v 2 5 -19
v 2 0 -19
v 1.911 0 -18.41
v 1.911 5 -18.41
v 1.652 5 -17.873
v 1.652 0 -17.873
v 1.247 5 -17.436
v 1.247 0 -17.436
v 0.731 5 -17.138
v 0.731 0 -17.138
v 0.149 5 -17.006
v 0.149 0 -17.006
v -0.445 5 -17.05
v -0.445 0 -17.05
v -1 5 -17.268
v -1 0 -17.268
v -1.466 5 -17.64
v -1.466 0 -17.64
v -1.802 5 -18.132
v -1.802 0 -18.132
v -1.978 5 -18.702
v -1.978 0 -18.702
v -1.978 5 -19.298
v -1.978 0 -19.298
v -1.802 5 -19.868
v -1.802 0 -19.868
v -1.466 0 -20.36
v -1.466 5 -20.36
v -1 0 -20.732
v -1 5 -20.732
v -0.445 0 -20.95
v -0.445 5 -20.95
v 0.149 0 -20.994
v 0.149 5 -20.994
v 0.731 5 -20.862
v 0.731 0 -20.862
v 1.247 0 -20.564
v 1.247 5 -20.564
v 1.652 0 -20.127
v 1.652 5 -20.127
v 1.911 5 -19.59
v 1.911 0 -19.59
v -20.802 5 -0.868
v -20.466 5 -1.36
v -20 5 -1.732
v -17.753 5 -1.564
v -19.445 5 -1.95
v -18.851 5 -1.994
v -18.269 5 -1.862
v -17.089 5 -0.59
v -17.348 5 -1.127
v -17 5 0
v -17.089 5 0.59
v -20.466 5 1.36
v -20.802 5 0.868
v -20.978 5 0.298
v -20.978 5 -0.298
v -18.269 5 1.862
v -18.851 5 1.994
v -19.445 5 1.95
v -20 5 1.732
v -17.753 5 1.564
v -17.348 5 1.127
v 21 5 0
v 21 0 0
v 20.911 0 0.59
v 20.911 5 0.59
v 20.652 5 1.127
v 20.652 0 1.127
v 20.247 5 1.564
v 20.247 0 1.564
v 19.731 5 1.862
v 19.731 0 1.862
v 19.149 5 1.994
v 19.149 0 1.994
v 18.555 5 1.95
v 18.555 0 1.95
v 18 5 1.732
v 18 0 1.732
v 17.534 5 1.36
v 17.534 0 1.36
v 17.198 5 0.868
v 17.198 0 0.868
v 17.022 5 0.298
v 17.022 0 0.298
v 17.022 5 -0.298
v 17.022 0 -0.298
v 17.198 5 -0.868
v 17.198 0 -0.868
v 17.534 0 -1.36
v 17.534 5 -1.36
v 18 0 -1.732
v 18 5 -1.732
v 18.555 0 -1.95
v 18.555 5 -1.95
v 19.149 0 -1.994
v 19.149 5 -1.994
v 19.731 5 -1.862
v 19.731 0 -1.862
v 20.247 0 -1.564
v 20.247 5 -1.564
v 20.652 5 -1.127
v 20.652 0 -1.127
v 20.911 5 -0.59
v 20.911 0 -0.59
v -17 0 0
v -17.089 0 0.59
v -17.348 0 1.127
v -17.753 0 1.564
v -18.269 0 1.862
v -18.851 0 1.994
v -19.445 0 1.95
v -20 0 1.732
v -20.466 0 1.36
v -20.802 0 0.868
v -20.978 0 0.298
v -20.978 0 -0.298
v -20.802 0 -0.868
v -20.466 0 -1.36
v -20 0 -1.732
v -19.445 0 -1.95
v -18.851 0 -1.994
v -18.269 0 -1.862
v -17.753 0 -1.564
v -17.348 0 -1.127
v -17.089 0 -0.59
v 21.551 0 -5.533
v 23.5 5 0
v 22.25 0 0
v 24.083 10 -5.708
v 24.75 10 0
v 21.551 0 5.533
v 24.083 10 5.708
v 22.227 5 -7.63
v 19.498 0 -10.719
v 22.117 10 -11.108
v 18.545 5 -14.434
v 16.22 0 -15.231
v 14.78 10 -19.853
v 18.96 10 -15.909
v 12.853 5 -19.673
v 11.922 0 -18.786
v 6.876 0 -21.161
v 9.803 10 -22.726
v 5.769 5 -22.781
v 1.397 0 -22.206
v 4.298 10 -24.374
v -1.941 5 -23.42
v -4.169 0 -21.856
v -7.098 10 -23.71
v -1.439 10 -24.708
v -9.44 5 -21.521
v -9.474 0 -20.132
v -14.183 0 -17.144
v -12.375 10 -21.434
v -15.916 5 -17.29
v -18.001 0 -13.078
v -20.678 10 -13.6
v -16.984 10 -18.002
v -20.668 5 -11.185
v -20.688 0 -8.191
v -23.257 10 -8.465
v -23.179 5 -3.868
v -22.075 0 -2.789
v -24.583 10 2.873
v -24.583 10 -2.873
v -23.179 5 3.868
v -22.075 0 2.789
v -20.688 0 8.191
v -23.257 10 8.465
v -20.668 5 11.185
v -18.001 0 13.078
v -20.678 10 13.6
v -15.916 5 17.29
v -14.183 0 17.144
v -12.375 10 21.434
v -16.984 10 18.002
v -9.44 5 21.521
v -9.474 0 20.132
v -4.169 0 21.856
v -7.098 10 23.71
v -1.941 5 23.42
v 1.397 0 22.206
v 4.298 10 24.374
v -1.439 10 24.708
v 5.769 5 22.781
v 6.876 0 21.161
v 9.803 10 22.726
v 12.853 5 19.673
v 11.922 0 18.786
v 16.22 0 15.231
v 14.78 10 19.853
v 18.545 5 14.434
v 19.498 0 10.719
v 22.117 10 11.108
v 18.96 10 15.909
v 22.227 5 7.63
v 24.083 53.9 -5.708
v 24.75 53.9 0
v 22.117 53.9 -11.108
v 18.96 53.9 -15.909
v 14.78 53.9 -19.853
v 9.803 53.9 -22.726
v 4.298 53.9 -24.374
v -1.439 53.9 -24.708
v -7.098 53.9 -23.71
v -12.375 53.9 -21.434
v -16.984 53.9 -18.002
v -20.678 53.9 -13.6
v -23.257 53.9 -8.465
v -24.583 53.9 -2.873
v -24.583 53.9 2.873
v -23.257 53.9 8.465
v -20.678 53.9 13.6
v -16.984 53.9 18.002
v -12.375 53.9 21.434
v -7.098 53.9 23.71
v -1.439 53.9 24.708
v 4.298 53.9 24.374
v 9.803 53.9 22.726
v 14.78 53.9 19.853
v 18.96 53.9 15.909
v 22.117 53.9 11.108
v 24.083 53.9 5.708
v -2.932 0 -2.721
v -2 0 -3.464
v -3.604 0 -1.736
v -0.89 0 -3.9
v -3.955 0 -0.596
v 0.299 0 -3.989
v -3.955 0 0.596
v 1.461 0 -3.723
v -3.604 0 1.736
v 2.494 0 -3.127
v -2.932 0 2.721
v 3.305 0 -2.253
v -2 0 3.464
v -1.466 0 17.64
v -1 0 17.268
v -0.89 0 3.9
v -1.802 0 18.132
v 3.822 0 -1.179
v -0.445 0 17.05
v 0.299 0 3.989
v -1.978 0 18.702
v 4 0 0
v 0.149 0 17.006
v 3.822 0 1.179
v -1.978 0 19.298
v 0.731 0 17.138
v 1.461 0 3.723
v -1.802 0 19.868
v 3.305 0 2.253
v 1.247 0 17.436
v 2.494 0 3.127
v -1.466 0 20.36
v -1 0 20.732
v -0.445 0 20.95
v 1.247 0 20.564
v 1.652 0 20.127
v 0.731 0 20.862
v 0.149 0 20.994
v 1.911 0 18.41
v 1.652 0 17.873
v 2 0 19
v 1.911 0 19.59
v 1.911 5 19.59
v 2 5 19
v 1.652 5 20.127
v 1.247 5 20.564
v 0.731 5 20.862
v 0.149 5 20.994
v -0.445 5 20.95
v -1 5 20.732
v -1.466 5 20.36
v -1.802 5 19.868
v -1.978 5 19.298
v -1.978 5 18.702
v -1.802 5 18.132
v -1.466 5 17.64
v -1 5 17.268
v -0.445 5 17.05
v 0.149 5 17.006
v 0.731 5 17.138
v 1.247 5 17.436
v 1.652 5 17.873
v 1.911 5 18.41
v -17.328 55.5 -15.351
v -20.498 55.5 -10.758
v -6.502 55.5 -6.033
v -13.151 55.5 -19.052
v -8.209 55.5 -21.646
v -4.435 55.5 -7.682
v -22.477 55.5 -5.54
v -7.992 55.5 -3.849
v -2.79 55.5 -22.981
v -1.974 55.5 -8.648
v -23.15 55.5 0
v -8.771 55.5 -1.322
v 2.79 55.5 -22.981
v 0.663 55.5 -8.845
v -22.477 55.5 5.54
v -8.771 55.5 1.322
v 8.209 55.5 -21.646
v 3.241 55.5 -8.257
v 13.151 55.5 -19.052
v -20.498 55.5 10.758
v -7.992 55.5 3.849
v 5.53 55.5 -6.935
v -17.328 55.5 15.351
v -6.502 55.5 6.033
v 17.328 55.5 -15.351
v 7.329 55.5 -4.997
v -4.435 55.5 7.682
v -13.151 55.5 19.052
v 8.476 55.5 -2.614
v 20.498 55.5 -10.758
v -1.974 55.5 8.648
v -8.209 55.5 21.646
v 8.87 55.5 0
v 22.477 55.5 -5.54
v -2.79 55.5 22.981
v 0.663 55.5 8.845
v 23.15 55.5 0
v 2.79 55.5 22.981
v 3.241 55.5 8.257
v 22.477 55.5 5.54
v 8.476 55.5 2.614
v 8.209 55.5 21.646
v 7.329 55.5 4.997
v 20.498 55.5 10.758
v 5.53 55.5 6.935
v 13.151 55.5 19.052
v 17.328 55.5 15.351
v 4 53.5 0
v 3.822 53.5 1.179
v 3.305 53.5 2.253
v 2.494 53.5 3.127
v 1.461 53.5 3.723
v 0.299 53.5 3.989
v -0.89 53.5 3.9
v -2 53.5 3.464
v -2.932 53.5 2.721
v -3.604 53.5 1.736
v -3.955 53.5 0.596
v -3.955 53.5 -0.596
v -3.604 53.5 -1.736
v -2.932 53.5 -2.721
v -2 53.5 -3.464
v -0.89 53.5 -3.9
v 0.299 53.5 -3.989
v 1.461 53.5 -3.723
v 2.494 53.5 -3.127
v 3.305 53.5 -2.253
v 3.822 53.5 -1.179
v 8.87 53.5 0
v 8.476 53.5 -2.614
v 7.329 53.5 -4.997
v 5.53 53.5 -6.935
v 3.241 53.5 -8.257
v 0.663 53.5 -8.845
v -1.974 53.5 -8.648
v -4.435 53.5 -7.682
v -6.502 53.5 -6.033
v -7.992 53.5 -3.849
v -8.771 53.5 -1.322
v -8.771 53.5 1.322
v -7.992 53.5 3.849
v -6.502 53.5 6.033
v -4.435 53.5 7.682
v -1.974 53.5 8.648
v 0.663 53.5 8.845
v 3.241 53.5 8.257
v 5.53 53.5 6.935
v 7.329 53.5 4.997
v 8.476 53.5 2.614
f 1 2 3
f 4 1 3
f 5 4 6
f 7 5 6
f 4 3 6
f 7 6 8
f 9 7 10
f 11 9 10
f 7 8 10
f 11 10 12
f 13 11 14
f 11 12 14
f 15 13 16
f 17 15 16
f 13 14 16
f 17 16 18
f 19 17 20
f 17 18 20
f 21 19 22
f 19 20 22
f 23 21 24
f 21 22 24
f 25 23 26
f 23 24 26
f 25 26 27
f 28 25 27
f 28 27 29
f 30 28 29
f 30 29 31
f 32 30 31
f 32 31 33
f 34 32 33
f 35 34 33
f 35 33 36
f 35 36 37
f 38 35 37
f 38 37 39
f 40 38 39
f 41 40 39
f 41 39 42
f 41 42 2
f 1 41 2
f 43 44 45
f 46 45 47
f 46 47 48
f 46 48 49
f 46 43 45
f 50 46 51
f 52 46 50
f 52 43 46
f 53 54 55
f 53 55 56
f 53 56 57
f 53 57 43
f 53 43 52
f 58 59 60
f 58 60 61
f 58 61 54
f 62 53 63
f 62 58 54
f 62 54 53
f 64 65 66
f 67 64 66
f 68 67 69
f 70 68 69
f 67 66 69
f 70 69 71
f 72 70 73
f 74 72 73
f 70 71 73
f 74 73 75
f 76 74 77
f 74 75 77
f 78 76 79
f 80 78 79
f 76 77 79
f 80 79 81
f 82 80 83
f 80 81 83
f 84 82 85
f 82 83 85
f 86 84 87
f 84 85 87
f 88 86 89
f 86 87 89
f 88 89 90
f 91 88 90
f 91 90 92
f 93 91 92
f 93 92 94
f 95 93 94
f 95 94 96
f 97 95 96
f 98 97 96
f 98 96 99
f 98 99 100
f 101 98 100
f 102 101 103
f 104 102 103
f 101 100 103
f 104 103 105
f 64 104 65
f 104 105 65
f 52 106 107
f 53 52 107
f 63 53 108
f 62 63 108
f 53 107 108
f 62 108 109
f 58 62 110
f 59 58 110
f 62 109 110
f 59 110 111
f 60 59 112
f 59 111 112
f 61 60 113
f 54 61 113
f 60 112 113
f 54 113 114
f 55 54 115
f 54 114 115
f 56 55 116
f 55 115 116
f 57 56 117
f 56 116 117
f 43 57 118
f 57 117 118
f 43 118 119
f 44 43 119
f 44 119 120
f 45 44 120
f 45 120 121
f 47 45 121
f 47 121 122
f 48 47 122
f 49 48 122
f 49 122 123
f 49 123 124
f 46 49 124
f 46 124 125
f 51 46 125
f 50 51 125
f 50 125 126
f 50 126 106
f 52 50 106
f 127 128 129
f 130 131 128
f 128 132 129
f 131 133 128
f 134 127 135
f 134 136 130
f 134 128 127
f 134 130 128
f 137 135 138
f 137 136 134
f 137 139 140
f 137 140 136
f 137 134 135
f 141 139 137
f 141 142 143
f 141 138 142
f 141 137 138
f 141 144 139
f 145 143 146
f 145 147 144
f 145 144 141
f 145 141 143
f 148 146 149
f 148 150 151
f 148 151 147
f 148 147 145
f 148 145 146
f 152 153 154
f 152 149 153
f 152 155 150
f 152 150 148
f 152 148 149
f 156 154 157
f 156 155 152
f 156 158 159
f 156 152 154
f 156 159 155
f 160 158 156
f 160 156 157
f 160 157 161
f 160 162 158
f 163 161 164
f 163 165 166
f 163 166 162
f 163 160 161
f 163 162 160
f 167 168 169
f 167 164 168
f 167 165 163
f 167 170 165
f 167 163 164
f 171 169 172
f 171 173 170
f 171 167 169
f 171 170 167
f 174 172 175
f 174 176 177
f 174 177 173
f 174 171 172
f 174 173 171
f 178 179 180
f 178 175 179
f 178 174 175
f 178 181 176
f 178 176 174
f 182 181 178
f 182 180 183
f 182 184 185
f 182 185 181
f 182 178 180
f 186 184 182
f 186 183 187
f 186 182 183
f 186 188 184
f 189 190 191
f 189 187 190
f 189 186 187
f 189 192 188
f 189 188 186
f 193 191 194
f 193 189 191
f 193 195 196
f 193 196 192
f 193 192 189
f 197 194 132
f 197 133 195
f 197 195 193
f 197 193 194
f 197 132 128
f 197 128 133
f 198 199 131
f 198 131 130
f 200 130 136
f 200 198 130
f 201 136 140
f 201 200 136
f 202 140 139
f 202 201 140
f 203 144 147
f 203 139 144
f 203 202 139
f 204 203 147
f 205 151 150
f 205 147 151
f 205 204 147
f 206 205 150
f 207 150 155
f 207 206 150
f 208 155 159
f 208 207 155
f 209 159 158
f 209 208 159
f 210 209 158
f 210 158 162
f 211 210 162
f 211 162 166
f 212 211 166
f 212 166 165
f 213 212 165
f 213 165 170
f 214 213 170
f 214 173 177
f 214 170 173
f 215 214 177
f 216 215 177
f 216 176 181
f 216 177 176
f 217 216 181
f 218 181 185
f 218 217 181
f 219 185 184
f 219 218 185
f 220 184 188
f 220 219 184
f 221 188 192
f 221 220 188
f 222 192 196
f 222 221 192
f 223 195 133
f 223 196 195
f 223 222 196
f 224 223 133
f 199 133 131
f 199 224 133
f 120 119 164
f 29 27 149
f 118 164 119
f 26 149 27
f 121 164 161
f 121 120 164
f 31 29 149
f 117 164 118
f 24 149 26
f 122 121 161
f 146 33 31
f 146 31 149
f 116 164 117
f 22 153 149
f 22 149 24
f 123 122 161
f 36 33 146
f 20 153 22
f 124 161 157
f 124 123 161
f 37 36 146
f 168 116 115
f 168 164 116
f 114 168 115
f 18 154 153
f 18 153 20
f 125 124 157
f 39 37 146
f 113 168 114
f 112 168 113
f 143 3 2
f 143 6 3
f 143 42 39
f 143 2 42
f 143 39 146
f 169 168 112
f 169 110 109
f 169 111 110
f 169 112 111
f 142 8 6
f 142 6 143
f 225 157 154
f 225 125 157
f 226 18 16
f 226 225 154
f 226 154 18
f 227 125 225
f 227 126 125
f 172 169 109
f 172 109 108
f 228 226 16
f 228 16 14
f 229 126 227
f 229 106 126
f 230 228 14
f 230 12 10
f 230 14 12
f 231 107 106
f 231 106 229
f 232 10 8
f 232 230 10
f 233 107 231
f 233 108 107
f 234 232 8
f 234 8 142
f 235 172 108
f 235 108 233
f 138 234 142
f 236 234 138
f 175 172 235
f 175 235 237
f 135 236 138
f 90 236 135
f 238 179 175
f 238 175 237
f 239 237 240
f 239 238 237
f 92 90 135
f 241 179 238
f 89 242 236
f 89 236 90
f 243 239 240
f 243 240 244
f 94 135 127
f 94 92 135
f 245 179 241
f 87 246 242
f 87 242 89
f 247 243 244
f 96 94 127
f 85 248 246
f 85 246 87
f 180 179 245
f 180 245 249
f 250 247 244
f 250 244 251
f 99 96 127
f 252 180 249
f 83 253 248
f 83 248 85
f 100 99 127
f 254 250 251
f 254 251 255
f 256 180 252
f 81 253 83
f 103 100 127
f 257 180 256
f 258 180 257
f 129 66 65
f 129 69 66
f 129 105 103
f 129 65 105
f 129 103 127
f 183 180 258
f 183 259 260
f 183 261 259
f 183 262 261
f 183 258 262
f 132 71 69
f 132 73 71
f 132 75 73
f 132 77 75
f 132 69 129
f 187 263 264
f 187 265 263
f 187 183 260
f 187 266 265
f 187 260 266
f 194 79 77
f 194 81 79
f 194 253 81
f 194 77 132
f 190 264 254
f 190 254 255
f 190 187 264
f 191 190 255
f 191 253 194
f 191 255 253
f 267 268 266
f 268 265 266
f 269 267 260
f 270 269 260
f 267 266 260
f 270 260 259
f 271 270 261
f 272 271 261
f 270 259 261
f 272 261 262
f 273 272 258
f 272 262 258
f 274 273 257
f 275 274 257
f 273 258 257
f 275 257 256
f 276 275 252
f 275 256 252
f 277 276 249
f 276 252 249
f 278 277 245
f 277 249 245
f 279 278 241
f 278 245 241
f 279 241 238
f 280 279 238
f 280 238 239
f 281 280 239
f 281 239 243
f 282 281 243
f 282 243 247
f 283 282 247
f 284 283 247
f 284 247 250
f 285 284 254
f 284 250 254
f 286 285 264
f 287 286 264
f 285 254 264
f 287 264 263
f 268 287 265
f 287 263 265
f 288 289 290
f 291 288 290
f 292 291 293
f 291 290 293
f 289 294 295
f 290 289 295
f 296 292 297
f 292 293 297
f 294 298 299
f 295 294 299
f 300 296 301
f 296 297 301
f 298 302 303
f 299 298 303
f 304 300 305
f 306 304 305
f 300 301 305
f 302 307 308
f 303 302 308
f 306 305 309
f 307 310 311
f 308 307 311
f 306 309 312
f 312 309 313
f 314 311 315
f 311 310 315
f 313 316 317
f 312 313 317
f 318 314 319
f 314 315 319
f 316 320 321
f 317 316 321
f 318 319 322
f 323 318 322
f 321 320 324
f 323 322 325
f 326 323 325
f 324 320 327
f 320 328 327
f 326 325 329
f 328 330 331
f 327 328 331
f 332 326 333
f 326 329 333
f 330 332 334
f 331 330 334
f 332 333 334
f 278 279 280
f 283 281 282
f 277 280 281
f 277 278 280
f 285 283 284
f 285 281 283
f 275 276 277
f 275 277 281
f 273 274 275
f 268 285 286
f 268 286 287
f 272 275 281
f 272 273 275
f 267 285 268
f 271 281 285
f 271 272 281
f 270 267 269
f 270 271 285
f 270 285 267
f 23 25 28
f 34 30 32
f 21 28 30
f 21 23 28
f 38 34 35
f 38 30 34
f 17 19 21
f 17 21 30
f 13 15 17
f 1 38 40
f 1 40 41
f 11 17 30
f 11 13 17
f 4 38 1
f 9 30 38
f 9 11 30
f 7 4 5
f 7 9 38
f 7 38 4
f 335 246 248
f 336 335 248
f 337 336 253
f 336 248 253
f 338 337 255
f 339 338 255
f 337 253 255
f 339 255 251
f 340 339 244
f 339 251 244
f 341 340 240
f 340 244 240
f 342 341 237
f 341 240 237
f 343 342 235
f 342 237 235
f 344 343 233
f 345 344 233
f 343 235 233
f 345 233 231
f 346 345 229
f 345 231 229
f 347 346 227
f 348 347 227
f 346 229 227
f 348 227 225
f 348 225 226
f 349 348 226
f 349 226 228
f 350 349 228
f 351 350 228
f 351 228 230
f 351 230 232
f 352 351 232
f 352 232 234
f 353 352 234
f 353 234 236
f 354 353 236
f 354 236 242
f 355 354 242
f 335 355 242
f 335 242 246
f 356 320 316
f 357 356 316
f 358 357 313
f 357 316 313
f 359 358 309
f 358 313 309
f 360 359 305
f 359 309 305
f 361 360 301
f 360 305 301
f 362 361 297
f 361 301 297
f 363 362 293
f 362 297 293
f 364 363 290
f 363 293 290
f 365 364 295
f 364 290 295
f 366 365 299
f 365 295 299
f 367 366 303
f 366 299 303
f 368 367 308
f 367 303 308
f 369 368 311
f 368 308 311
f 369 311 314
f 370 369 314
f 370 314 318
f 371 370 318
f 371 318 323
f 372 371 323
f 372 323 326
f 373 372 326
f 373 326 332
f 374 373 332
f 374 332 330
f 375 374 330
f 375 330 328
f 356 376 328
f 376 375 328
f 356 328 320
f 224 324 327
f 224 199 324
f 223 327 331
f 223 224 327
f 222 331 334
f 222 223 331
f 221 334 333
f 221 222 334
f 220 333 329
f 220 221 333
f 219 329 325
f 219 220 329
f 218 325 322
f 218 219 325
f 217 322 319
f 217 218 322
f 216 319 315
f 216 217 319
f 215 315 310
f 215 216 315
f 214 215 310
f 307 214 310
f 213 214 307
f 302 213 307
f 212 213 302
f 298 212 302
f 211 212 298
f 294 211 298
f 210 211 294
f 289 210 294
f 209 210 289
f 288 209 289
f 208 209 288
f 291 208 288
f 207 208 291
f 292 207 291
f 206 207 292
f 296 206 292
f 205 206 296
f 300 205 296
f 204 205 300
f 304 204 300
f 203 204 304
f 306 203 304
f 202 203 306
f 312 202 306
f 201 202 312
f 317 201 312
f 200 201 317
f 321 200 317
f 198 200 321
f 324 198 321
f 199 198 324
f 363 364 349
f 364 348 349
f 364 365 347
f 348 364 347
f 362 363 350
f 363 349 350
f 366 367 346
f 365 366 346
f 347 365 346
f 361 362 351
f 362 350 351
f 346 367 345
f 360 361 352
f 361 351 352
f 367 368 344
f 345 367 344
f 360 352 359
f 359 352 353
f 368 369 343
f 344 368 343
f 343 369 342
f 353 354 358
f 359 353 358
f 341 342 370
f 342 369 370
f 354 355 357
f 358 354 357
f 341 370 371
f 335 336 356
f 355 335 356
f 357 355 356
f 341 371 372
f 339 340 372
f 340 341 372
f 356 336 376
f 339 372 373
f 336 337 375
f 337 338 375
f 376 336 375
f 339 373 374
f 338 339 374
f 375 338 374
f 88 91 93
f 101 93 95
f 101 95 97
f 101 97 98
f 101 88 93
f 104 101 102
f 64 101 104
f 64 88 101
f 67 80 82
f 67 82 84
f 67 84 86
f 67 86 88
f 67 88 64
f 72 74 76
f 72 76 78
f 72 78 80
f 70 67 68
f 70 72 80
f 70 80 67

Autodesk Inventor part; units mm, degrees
ref_plane "YZ Plane" through (0, 0, 0) normal (1, 0, 0) x (0, 1, 0)
ref_plane "XZ Plane" through (0, 0, 0) normal (0, 1, 0) x (-1, 0, 0)
ref_plane "XY Plane" through (0, 0, 0) normal (0, 0, 1) x (1, 0, 0)
sketch "Sketch1" plane through (0, 0, 0) normal (0, 0, 1) x (1, 0, 0)
  line L0 (4, 53.5) -> (4, 0)
  line L1 (4, 0) -> (24.75, 0)
  line L2 (24.75, 0) -> (24.75, 55.5)
  line L3 (24.75, 55.5) -> (0, 55.5)
  line L4 (24.75, 13) -> (24.75, 12)
  line L5 (24.75, 12) -> (15.6045, 12)
  line L6 (15.6045, 12) -> (15.6045, 13)
  line L7 (15.6045, 13) -> (24.75, 13)
  line L8 (24.75, 13) -> (24.75, 12)
  line L9 (4, 53.5) -> (8.87, 53.5)
  line L10 (8.87, 53.5) -> (8.87, 55.5)
  line L11 (0, 55.5) -> (0, 0)
  point P0 (8.87, 54.5)
  dimension "d2" = 55.5
  dimension "d32" = 1
  dimension "d33" = 12
  dimension "d36" = 2
  dimension "d37" = 49.5
  dimension "d38" = 8
  dimension "d39" = 17.74
revolve "Revolution1" add sketch "Sketch1" angle 360 about axis through (0, 55.5, 0) along (0, -1, 0)
sketch "Sketch2" plane through (0, 0, 0) normal (0, -1, 0) x (1, 0, 0)
  circle A0 centre (19, 0) radius 2
  circle A1 centre (0, 0) radius 4 construction
  line L0 (0, 0) -> (19, 0) construction
  circle A2 centre (0, 19) radius 2
  circle A3 centre (-19, 0) radius 2
  circle A4 centre (0, -19) radius 2
  point P0 (0, 0)
  dimension "d5" = 4
  dimension "d6" = 19
  dimension "d9" = 360
extrude "Extrusion1" cut sketch "Sketch2" against normal blind 5
chamfer "Chamfer1" distance 1.6 angle 45 1 edges at (-24.75, 55.5, 0)
chamfer "Chamfer2" distance 2.5 distance2 10 1 edges at (-24.75, 0, 0) measured on face at (13.1279, 0, -6.9036)
properties part number "5065"
